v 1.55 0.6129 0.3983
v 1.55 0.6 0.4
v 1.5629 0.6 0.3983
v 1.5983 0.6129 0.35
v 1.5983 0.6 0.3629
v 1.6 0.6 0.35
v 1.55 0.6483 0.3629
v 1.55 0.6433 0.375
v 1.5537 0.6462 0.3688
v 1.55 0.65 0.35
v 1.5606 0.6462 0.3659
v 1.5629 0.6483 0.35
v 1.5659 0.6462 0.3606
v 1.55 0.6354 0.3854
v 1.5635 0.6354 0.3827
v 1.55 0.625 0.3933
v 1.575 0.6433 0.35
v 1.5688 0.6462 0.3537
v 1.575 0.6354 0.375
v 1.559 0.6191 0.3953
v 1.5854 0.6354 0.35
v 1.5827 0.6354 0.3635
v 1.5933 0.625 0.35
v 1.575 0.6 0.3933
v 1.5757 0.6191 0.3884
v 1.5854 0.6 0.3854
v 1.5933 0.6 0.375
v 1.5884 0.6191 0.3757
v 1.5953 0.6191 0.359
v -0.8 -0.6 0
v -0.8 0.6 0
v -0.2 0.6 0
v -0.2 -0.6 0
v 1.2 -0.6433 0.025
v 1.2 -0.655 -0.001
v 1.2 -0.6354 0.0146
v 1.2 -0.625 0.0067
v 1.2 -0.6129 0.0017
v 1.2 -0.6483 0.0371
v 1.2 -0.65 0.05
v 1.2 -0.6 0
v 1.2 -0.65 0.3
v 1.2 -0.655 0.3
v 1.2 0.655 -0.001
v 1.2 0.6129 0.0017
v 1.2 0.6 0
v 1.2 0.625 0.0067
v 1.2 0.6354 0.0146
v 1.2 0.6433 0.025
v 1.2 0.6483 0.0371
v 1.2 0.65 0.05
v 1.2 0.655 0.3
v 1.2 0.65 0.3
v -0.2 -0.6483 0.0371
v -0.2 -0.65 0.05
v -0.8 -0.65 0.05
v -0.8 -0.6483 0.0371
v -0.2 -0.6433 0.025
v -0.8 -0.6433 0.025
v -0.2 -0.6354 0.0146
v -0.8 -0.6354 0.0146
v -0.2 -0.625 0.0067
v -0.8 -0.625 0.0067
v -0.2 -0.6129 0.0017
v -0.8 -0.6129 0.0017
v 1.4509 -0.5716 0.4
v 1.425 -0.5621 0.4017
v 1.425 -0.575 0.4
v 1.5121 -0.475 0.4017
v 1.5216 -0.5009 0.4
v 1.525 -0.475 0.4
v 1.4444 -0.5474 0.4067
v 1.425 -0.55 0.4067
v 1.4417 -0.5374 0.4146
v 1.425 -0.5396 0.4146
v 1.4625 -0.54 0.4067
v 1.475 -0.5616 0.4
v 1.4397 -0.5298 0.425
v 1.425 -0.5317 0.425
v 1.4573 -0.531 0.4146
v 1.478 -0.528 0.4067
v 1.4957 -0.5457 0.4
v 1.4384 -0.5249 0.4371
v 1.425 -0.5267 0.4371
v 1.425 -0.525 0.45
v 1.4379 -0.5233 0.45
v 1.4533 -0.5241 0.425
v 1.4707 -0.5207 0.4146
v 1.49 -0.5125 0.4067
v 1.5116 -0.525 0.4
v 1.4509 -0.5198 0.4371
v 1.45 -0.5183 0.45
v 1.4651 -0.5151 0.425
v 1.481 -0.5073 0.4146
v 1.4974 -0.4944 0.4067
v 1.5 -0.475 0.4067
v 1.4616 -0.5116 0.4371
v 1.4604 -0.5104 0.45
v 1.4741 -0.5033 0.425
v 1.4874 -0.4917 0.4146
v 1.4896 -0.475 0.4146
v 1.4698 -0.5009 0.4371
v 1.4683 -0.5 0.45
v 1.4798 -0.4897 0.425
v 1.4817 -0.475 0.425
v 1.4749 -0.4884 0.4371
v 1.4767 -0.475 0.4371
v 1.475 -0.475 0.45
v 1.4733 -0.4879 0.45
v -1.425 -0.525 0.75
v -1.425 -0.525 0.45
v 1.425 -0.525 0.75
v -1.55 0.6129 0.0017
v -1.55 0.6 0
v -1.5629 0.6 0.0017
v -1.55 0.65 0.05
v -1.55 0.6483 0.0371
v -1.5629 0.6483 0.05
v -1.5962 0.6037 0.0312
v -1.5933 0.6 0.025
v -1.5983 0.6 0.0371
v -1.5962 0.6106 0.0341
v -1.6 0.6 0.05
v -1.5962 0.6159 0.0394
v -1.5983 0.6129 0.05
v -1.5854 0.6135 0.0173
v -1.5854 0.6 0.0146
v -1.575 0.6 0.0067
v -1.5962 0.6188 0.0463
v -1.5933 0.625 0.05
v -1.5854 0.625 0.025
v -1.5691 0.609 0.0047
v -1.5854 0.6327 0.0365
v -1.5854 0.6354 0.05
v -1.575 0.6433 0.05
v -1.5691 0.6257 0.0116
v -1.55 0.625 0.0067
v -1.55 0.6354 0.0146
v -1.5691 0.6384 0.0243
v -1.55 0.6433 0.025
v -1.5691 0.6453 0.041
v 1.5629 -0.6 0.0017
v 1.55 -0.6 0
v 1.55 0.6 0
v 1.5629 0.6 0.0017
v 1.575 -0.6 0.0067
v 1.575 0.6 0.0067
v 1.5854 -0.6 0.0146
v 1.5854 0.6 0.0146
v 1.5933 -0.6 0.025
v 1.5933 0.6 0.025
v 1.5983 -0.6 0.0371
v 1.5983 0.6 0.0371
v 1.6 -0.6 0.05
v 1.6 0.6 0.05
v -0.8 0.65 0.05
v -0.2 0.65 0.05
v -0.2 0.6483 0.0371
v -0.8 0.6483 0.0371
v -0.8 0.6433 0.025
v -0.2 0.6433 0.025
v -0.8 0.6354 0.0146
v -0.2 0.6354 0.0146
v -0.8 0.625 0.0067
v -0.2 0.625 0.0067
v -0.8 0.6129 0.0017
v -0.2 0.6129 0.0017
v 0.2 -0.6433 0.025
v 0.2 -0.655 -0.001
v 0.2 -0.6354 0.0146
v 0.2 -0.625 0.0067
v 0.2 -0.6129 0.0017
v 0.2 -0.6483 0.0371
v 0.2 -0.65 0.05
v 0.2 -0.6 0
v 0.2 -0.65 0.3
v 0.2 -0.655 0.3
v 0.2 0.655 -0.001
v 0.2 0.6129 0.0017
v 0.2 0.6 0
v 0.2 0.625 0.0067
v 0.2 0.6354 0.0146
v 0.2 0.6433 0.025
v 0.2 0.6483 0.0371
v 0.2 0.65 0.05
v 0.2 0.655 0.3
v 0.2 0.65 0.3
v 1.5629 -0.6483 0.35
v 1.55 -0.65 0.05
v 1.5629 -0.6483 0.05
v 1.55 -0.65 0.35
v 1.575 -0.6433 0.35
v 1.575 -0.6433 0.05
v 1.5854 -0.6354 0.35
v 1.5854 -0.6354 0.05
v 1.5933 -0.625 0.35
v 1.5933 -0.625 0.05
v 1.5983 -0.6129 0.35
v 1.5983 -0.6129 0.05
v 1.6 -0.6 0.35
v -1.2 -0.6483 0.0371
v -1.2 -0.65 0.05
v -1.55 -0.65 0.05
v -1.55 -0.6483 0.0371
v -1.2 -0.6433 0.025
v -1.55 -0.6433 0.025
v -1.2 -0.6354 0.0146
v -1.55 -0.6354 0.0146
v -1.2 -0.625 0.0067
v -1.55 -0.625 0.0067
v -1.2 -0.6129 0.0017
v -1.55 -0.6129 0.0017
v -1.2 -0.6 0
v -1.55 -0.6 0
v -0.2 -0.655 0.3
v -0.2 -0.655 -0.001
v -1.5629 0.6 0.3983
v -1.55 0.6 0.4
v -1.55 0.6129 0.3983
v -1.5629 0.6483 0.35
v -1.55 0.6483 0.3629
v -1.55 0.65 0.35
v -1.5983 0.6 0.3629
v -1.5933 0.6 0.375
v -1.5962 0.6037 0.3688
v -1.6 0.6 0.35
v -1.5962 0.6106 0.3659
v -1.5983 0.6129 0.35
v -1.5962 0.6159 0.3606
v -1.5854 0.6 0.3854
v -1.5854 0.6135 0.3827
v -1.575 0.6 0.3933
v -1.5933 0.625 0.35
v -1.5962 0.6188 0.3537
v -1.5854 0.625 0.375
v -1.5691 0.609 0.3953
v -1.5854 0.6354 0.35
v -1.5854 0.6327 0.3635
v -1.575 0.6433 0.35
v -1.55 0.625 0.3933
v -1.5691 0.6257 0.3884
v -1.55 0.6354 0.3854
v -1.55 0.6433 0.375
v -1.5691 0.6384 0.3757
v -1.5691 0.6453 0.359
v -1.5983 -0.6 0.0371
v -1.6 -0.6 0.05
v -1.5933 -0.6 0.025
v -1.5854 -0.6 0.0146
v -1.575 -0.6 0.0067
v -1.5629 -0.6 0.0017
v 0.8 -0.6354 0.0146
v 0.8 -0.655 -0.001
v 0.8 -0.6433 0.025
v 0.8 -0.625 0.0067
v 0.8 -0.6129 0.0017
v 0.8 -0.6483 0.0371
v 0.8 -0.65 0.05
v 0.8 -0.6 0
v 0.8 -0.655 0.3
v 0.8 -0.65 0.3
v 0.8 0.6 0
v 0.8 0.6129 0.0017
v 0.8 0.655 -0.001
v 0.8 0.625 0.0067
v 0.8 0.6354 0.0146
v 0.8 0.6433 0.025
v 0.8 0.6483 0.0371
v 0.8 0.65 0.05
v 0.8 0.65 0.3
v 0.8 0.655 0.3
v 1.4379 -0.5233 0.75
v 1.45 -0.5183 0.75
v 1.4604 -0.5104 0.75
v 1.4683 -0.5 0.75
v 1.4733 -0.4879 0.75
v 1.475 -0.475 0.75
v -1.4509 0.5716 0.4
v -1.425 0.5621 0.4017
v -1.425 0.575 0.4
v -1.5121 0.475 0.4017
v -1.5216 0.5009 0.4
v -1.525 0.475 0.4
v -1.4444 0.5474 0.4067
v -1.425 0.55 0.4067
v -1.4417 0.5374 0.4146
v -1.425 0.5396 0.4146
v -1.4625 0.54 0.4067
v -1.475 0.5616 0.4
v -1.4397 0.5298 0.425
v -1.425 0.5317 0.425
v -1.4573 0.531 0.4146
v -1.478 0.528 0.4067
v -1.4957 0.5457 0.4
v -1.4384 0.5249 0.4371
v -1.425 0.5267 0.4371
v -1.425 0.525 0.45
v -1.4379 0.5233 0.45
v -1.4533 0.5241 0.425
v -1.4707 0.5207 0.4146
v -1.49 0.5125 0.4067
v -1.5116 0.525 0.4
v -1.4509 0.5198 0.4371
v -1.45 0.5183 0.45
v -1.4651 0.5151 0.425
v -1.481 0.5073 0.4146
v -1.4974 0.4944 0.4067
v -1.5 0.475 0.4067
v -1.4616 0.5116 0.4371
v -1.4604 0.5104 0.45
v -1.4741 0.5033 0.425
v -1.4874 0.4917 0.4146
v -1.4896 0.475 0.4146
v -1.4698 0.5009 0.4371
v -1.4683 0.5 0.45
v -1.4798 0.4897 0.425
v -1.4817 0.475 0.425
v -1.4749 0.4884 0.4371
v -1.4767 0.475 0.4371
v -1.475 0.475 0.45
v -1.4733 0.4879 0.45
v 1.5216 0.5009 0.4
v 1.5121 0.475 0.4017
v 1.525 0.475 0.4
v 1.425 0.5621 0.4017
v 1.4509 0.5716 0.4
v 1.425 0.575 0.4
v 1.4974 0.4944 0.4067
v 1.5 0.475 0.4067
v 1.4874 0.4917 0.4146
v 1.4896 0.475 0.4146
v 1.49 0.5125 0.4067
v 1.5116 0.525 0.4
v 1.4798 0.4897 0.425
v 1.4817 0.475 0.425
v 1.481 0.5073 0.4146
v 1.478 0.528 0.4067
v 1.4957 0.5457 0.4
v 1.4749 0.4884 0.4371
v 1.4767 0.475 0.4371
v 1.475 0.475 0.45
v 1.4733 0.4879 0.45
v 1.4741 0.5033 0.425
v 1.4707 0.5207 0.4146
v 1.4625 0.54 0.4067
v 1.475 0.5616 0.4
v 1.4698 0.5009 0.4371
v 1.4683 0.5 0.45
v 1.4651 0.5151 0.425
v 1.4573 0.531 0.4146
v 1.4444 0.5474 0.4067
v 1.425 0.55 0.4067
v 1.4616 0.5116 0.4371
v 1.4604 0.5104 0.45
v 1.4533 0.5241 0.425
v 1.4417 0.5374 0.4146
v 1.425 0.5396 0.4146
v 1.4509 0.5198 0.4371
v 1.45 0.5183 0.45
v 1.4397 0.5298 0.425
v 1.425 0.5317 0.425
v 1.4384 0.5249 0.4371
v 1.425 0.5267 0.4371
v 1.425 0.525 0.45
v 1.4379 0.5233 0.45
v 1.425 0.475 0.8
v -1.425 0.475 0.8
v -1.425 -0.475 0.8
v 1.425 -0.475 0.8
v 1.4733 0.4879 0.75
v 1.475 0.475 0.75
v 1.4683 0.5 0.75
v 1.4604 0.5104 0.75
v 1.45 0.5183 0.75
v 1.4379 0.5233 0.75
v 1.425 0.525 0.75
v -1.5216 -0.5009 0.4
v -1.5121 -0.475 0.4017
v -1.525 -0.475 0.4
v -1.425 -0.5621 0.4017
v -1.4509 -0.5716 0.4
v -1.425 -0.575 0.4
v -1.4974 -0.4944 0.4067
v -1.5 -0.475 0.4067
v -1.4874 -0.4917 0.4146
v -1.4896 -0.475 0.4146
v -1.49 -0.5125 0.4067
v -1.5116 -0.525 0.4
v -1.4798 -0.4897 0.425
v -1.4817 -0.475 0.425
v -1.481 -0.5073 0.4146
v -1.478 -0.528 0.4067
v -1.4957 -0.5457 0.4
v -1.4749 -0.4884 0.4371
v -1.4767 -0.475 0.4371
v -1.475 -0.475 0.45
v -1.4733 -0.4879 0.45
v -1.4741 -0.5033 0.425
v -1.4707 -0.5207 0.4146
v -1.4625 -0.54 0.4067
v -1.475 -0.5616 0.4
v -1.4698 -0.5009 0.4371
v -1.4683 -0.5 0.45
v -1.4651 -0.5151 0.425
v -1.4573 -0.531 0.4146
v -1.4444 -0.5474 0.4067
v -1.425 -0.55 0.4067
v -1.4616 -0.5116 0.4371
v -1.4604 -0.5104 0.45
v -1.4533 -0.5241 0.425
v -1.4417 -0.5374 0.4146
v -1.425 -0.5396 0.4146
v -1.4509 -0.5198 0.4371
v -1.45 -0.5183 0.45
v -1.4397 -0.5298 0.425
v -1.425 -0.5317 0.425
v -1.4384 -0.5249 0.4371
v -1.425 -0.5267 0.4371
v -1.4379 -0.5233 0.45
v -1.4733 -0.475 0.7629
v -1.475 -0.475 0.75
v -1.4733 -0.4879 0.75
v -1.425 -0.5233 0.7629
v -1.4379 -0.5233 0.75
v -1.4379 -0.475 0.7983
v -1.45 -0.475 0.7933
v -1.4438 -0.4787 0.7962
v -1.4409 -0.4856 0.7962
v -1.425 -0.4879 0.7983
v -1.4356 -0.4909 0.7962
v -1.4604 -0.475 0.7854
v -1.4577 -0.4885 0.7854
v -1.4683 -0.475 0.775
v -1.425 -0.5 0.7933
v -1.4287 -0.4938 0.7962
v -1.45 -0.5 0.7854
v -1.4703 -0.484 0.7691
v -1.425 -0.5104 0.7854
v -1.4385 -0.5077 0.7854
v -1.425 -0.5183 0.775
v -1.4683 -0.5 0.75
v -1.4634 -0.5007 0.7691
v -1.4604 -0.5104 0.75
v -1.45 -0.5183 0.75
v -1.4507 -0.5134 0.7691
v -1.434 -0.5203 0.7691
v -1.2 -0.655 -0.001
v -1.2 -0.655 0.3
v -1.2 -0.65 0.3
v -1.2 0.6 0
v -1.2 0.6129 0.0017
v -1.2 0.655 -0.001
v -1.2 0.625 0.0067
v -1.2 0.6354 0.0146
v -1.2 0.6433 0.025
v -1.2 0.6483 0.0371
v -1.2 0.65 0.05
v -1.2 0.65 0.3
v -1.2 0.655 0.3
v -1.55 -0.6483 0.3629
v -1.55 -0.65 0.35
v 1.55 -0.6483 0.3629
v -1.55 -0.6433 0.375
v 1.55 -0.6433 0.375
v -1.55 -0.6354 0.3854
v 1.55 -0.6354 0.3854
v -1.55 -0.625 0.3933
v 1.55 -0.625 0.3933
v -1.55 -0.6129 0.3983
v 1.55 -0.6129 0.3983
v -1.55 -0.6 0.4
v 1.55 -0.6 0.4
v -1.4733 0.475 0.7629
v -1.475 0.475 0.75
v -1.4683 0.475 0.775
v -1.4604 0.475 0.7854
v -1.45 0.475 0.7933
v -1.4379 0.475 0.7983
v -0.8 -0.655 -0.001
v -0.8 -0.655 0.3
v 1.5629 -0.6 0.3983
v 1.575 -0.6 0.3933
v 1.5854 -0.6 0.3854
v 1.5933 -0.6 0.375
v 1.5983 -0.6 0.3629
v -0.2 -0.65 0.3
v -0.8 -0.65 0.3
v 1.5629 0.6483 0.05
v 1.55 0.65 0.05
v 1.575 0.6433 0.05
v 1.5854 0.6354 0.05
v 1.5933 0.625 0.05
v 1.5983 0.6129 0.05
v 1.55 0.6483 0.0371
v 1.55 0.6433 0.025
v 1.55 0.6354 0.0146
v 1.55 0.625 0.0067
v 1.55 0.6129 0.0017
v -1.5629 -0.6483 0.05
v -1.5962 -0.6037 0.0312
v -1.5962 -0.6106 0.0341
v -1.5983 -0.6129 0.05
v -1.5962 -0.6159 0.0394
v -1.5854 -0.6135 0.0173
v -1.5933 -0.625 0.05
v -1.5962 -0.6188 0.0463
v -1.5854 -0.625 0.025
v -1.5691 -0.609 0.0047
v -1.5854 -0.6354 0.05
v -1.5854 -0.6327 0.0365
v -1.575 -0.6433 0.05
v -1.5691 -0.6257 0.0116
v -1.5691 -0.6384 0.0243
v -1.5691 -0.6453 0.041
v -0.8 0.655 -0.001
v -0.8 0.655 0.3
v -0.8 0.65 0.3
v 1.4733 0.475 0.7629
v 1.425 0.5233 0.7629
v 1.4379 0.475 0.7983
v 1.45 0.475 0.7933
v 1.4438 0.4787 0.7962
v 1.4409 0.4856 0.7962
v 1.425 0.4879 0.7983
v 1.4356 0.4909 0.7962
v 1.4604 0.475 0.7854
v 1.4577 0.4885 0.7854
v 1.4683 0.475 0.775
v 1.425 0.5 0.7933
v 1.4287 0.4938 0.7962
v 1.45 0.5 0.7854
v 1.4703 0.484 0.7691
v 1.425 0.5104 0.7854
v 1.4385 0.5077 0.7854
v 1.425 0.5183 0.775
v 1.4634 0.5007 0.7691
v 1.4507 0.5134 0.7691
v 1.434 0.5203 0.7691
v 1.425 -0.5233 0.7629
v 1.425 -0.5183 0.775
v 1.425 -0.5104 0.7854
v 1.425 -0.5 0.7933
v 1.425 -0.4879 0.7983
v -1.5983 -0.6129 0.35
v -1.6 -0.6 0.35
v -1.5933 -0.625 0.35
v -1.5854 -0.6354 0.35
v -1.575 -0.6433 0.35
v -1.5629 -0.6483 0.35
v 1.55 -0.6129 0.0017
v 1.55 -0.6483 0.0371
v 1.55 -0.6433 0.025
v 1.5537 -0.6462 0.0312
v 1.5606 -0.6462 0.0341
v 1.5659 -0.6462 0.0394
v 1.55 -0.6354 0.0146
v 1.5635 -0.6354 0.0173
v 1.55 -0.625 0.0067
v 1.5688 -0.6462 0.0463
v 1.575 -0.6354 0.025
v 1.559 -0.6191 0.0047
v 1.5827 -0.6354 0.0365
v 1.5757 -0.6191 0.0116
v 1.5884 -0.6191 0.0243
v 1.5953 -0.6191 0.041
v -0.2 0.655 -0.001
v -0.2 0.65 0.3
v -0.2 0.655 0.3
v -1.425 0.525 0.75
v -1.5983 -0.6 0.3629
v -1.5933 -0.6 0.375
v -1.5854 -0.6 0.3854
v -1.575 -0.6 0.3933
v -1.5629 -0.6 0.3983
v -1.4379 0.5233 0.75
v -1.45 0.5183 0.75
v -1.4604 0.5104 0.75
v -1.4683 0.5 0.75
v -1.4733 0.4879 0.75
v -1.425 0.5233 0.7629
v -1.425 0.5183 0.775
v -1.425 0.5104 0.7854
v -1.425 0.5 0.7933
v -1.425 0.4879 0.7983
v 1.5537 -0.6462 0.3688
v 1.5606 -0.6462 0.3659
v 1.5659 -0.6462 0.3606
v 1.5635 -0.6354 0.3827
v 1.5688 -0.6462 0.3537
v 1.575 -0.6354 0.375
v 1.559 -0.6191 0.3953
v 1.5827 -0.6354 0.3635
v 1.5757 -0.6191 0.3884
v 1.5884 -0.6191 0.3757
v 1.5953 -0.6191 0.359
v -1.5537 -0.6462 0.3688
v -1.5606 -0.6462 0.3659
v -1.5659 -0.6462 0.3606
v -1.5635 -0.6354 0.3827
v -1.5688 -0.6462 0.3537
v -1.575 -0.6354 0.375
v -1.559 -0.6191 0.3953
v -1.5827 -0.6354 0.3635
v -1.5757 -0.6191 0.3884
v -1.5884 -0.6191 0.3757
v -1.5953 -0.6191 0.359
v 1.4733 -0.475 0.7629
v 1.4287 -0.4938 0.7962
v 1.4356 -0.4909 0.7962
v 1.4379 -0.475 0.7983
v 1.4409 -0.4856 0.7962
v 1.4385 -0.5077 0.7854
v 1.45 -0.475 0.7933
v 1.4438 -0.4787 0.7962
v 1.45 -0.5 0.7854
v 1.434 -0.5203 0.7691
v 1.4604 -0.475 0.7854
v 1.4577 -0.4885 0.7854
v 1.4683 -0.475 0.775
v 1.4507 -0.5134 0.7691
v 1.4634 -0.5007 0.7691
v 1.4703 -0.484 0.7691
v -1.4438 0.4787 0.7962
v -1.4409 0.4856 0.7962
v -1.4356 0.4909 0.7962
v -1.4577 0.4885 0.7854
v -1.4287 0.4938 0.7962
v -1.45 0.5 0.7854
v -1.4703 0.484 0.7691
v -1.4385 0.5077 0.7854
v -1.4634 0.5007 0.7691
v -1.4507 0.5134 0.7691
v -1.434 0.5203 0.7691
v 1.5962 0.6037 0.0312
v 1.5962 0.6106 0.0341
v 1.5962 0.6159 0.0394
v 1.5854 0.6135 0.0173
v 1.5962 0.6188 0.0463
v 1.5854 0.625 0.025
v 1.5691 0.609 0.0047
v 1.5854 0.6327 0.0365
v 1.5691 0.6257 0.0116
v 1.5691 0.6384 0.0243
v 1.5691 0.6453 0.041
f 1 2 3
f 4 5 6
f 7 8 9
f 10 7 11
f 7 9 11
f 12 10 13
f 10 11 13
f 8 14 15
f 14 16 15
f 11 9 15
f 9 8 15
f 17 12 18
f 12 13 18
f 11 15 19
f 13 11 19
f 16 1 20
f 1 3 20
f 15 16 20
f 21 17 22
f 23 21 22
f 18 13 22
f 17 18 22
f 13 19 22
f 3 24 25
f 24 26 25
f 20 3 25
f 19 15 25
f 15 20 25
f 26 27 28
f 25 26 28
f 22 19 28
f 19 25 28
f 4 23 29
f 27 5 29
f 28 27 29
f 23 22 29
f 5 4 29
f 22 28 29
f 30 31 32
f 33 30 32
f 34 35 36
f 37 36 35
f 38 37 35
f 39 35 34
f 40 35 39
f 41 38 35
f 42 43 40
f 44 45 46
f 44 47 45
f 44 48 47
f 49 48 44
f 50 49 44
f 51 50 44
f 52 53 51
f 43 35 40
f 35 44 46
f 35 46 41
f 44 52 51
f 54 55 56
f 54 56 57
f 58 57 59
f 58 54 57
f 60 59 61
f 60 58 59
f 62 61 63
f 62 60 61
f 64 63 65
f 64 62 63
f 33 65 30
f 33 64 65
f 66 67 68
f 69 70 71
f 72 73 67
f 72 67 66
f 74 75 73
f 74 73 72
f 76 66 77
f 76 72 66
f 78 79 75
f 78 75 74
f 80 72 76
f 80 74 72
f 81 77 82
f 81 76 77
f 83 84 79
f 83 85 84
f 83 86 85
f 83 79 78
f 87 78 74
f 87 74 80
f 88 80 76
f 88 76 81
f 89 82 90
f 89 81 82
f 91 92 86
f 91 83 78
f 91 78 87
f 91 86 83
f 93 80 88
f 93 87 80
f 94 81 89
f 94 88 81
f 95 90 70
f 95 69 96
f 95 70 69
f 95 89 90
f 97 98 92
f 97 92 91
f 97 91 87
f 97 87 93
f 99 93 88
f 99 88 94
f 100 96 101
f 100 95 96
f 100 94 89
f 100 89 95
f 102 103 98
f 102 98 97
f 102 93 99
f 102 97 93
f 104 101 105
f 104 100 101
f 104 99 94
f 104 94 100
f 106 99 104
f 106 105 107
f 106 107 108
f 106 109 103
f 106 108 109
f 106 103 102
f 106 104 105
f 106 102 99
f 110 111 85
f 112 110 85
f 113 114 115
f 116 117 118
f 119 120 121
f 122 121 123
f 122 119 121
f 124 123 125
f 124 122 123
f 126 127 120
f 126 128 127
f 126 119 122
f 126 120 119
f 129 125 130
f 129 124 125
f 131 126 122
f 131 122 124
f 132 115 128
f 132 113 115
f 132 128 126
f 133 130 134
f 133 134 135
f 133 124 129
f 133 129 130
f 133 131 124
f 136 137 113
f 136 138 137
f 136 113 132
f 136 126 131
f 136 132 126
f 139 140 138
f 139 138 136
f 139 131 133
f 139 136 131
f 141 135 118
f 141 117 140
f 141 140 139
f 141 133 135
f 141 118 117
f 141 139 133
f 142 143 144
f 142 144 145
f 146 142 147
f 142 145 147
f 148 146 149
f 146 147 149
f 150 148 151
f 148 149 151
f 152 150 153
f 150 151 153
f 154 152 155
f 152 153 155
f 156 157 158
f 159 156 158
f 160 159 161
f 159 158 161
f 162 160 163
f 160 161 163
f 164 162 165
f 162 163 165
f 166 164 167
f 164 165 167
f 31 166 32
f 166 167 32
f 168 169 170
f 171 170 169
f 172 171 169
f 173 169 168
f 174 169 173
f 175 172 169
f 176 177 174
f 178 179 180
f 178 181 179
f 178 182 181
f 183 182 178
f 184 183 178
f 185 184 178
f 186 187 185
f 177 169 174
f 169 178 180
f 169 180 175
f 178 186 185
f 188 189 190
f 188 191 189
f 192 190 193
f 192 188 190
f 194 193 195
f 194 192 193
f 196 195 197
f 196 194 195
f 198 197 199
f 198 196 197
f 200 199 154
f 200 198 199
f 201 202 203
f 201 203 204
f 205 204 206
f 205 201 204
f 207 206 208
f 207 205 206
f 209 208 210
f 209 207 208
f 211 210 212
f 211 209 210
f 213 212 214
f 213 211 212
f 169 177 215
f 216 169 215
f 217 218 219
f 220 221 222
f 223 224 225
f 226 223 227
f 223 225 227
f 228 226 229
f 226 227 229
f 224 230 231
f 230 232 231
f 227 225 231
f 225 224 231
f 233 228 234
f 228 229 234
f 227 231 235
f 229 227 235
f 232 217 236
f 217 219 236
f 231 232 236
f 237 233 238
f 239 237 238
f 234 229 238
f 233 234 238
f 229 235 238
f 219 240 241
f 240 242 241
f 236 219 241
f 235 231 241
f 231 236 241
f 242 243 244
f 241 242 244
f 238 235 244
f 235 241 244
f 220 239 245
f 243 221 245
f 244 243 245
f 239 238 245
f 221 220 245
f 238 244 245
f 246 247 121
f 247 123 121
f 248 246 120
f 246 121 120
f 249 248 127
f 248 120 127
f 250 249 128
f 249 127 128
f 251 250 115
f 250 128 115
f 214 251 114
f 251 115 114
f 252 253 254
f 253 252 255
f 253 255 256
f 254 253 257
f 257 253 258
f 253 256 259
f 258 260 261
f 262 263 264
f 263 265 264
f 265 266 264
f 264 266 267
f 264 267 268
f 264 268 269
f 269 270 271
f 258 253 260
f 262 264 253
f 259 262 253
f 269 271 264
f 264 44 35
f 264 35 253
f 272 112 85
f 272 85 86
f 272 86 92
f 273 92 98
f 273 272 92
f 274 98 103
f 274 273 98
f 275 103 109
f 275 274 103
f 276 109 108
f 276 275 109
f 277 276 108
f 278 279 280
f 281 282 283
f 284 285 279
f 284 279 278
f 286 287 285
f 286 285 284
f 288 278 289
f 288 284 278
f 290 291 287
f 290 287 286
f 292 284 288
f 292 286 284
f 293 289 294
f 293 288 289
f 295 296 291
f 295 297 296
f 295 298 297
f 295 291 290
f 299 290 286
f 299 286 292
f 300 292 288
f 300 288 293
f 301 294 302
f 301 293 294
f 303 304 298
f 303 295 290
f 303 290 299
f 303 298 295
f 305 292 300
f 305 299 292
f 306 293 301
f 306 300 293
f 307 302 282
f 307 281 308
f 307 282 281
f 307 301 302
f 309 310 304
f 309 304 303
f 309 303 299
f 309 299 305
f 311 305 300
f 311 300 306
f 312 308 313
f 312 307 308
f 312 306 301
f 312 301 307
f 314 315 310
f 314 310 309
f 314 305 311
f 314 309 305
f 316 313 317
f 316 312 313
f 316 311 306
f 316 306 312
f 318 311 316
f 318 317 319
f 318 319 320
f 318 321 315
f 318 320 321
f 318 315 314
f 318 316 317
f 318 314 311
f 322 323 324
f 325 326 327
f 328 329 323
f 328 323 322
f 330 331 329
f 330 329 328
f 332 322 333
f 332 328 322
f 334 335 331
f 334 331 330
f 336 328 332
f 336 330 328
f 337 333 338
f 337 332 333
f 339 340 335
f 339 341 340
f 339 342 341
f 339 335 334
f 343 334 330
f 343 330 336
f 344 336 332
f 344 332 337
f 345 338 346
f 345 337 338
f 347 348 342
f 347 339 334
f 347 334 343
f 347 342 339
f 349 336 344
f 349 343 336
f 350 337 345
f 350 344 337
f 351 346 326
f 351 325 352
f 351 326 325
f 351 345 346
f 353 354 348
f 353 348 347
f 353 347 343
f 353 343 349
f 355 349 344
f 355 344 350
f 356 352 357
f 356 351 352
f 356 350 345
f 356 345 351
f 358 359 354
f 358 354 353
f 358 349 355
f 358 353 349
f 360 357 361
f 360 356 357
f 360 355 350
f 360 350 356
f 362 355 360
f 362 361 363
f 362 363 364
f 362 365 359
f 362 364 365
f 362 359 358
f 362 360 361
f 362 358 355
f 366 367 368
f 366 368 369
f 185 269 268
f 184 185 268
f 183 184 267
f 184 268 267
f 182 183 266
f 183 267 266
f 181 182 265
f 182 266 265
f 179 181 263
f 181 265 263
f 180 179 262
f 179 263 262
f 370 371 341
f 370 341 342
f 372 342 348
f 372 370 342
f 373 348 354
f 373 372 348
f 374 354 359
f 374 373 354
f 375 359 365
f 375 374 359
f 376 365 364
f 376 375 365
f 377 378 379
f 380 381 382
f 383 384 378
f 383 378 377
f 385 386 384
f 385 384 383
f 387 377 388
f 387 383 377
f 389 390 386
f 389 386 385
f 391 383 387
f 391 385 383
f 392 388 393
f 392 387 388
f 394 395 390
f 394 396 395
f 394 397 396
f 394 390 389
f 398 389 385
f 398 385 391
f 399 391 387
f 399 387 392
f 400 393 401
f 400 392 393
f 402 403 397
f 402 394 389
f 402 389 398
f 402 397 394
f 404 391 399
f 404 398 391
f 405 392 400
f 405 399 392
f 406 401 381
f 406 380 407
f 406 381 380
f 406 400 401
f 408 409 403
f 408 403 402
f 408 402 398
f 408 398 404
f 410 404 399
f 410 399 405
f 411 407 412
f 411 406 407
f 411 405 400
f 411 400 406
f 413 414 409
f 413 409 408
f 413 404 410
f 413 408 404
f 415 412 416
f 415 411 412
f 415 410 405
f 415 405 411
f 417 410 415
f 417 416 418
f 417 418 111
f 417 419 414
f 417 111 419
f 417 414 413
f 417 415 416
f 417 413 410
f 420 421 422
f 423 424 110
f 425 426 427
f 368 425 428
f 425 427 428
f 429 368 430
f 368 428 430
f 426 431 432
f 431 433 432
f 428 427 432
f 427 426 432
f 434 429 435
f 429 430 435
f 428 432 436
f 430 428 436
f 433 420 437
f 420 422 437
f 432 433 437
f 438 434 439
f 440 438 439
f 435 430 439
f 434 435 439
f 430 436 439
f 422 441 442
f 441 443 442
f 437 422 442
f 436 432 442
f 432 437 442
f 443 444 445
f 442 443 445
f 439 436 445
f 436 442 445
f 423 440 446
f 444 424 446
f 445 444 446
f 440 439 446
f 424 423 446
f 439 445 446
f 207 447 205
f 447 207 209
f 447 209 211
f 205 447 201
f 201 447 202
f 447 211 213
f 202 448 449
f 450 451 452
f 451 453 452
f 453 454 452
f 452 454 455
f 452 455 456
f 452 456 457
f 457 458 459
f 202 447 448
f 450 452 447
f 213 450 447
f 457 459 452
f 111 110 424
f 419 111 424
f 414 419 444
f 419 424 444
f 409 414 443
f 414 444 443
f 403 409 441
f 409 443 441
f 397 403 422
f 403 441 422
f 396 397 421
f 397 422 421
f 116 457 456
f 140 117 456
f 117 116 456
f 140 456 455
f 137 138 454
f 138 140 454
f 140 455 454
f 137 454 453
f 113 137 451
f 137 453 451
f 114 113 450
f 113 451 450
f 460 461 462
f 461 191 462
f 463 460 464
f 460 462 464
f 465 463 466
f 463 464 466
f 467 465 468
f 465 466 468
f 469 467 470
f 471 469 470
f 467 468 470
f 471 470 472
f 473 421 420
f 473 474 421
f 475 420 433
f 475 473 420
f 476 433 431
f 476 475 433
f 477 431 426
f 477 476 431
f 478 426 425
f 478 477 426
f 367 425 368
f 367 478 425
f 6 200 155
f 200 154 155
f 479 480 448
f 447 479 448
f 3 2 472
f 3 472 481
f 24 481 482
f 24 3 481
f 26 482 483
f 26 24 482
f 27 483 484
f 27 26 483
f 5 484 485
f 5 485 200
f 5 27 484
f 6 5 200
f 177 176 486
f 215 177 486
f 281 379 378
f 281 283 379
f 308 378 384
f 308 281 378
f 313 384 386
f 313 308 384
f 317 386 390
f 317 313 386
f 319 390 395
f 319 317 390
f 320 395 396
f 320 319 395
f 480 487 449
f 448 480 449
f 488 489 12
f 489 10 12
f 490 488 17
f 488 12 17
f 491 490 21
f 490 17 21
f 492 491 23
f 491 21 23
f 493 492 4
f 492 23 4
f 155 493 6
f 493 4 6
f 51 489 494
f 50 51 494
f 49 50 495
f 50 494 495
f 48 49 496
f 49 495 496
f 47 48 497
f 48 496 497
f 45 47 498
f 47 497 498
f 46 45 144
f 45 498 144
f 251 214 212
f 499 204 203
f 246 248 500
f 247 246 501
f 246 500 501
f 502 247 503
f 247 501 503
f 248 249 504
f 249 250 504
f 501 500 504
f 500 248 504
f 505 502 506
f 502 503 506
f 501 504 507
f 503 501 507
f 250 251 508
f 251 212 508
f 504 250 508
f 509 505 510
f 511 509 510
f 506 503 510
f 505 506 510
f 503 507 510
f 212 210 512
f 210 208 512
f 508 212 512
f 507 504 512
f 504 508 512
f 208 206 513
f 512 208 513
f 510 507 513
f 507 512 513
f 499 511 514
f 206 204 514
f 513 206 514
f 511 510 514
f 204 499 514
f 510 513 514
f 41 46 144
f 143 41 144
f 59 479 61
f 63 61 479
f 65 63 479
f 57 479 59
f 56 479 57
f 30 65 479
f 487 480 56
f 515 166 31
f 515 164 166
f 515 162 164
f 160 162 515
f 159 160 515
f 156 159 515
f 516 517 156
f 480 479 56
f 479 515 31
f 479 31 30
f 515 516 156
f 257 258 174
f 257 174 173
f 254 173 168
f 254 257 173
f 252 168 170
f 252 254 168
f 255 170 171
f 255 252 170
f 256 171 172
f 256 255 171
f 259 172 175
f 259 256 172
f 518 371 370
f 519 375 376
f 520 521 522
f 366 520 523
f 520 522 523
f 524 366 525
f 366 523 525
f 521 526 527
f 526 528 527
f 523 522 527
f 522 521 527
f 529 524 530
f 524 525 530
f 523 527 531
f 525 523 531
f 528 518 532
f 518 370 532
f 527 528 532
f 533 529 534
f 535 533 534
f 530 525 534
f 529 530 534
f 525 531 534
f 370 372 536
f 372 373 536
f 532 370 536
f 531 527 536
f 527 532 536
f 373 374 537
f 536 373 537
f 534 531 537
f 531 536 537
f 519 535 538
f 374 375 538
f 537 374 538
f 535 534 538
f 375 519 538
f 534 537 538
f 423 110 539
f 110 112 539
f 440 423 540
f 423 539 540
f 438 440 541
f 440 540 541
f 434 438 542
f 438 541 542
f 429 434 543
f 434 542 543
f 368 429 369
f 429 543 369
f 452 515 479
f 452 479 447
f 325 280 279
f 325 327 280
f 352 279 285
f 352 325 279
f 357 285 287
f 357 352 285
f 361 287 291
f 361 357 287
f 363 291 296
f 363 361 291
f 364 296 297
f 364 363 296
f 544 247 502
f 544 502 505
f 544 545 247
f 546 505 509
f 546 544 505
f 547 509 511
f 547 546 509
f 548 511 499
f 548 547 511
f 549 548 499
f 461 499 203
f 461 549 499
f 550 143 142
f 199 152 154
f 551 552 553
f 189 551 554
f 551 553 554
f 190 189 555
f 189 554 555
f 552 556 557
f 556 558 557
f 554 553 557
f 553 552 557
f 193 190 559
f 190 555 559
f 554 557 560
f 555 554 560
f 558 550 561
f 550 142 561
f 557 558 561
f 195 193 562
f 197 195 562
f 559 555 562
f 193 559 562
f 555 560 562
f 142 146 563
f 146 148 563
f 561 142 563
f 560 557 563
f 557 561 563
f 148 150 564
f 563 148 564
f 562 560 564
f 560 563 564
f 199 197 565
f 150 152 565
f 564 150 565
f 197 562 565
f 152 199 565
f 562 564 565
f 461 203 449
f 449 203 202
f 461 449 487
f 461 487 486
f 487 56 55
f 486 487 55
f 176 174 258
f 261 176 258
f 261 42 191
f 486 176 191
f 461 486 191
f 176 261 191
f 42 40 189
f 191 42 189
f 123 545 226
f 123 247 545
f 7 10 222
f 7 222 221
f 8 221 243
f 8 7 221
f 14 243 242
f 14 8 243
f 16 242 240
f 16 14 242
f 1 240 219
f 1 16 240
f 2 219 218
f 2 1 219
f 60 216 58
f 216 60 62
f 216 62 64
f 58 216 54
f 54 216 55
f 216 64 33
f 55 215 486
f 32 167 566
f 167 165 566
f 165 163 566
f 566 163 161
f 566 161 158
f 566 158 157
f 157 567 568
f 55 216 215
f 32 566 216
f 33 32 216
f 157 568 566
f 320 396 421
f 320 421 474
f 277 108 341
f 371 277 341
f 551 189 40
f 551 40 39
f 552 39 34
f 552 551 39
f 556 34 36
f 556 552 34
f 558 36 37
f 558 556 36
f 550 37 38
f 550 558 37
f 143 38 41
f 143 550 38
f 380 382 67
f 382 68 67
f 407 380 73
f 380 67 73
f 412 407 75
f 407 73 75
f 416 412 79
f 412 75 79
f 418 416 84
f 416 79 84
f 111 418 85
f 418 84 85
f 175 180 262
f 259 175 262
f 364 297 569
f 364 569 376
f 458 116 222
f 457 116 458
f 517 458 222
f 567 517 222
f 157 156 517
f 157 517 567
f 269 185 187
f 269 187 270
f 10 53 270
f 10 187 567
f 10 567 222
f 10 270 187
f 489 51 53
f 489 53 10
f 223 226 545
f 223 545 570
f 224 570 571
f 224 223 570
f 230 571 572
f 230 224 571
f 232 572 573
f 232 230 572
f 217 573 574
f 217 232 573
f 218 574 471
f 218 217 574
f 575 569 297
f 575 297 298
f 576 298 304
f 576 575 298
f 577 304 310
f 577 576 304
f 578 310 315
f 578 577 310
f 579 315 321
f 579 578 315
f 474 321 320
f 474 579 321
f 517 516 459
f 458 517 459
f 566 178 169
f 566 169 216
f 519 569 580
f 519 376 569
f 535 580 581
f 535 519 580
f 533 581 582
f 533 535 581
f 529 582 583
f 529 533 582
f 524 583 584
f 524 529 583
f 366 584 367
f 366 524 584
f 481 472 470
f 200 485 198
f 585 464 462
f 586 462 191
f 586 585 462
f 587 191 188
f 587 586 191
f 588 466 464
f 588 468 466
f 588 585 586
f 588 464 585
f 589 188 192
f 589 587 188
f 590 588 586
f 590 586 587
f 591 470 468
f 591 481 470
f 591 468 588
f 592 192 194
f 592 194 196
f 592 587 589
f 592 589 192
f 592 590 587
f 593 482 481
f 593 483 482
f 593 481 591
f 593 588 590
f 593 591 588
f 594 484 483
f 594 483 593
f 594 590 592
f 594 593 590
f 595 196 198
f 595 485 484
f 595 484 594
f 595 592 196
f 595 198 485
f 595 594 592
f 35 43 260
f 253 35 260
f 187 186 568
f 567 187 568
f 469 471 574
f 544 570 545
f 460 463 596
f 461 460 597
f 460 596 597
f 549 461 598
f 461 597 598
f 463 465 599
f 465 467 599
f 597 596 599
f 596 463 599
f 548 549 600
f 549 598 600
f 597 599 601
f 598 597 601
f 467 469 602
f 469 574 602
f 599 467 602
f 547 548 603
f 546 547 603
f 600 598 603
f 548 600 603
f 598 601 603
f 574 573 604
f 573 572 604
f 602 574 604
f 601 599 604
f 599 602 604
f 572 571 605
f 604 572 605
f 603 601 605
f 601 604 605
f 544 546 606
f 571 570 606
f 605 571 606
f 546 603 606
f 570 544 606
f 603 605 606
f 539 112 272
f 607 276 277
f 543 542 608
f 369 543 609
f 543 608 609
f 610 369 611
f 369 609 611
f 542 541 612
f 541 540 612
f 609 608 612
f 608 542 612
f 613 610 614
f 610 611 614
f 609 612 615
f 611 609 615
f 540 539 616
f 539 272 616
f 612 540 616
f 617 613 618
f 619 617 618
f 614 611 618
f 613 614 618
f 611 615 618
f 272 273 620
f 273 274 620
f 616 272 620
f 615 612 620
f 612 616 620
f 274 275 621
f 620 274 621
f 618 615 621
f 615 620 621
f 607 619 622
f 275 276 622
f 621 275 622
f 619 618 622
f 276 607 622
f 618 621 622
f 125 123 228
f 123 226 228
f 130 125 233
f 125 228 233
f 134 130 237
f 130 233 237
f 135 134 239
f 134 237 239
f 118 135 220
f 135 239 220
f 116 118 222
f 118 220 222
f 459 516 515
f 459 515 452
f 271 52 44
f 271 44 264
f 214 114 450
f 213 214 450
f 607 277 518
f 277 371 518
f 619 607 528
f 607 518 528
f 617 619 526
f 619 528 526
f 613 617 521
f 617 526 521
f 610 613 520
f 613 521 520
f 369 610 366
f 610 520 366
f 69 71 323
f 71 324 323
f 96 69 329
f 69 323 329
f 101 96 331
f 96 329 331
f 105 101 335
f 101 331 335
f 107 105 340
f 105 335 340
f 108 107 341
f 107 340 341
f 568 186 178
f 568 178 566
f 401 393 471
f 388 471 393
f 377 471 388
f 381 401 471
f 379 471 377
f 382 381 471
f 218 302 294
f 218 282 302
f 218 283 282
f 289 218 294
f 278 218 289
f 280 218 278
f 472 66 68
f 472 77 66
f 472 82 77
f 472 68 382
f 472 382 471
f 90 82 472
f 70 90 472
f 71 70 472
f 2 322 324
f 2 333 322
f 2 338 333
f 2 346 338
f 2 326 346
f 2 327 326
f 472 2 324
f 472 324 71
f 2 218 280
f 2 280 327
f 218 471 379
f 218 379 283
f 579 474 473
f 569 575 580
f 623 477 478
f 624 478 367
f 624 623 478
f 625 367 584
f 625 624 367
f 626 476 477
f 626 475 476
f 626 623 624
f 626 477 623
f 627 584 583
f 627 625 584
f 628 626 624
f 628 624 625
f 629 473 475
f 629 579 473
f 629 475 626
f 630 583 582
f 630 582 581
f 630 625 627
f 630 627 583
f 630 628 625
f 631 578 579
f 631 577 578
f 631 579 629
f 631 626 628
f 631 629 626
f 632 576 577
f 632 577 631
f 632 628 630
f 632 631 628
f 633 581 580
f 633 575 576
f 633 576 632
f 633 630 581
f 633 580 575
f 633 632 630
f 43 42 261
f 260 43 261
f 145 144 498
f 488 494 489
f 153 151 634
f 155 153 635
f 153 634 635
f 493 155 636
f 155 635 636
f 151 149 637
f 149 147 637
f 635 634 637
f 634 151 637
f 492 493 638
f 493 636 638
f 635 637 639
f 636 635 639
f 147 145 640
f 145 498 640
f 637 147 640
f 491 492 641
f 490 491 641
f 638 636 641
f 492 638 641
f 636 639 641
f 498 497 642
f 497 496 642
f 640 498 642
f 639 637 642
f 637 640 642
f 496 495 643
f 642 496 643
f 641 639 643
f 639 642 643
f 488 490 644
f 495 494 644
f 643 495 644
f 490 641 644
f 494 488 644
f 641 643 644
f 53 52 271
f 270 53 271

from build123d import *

# Parameters (mm, degrees)
SKETCH1_W                = 3.2
SKETCH1_H                = 1.3
BOSS_EXTRUDE1_DEPTH      = 0.4
SKETCH2_W                = 2.95
SKETCH2_H                = 1.05
BOSS_EXTRUDE2_DEPTH      = 0.4
FILLET1_R                = 0.05
BOSS_EXTRUDE3_DEPTH      = 0.001
BOSS_EXTRUDE3_DEPTH_BACK = 0.3
SKETCH3_W                = 0.4
SKETCH3_H                = 1.31


with BuildPart() as part:
    # Sketch1 → Boss-Extrude1 (new body)
    with BuildSketch(Plane.XY):
        Rectangle(SKETCH1_W, SKETCH1_H)
    extrude(amount=BOSS_EXTRUDE1_DEPTH)

    # Sketch2 → Boss-Extrude2 (add)
    with BuildSketch(Plane.XY.offset(0.4)):
        Rectangle(SKETCH2_W, SKETCH2_H)
    extrude(amount=BOSS_EXTRUDE2_DEPTH)

    # Fillet1
    fillet1_edges = [part.edges().sort_by_distance(p)[0] for p in [
        (1.6, 0, 0.4),
        (0, 0.65, 0.4),
        (-1.475, 0, 0.4),
        (-1.475, 0.525, 0.6),
        (0, -0.525, 0.4),
        (-1.475, -0.525, 0.6),
        (1.475, 0, 0.4),
        (1.475, -0.525, 0.6),
        (0, 0.525, 0.4),
        (1.475, 0.525, 0.6),
        (-1.475, 0, 0.8),
        (0, -0.525, 0.8),
        (1.475, 0, 0.8),
        (0, 0.525, 0.8),
        (-1.6, 0, 0.4),
        (0, 0.65, 0),
        (1.6, 0, 0),
        (0, -0.65, 0),
        (-1.6, 0, 0),
        (0, -0.65, 0.4),
        (-1.6, 0.65, 0.2),
        (1.6, 0.65, 0.2),
        (1.6, -0.65, 0.2),
        (-1.6, -0.65, 0.2),
    ]]
    fillet(fillet1_edges, radius=FILLET1_R)

    # Sketch3 → Boss-Extrude3 (add, two sides: drawn at the far end of the back side and taken through both)
    with BuildSketch(Plane(origin=(0, 0, 0), x_dir=(-1, 0, 0), z_dir=(0, 0, -1)).offset(-BOSS_EXTRUDE3_DEPTH_BACK)):
        with Locations((1, 0)):
            Rectangle(SKETCH3_W, SKETCH3_H)
        Rectangle(SKETCH3_W, SKETCH3_H)
        with Locations((-1, 0)):
            Rectangle(SKETCH3_W, SKETCH3_H)
    extrude(amount=BOSS_EXTRUDE3_DEPTH + BOSS_EXTRUDE3_DEPTH_BACK)


solid = part.part
